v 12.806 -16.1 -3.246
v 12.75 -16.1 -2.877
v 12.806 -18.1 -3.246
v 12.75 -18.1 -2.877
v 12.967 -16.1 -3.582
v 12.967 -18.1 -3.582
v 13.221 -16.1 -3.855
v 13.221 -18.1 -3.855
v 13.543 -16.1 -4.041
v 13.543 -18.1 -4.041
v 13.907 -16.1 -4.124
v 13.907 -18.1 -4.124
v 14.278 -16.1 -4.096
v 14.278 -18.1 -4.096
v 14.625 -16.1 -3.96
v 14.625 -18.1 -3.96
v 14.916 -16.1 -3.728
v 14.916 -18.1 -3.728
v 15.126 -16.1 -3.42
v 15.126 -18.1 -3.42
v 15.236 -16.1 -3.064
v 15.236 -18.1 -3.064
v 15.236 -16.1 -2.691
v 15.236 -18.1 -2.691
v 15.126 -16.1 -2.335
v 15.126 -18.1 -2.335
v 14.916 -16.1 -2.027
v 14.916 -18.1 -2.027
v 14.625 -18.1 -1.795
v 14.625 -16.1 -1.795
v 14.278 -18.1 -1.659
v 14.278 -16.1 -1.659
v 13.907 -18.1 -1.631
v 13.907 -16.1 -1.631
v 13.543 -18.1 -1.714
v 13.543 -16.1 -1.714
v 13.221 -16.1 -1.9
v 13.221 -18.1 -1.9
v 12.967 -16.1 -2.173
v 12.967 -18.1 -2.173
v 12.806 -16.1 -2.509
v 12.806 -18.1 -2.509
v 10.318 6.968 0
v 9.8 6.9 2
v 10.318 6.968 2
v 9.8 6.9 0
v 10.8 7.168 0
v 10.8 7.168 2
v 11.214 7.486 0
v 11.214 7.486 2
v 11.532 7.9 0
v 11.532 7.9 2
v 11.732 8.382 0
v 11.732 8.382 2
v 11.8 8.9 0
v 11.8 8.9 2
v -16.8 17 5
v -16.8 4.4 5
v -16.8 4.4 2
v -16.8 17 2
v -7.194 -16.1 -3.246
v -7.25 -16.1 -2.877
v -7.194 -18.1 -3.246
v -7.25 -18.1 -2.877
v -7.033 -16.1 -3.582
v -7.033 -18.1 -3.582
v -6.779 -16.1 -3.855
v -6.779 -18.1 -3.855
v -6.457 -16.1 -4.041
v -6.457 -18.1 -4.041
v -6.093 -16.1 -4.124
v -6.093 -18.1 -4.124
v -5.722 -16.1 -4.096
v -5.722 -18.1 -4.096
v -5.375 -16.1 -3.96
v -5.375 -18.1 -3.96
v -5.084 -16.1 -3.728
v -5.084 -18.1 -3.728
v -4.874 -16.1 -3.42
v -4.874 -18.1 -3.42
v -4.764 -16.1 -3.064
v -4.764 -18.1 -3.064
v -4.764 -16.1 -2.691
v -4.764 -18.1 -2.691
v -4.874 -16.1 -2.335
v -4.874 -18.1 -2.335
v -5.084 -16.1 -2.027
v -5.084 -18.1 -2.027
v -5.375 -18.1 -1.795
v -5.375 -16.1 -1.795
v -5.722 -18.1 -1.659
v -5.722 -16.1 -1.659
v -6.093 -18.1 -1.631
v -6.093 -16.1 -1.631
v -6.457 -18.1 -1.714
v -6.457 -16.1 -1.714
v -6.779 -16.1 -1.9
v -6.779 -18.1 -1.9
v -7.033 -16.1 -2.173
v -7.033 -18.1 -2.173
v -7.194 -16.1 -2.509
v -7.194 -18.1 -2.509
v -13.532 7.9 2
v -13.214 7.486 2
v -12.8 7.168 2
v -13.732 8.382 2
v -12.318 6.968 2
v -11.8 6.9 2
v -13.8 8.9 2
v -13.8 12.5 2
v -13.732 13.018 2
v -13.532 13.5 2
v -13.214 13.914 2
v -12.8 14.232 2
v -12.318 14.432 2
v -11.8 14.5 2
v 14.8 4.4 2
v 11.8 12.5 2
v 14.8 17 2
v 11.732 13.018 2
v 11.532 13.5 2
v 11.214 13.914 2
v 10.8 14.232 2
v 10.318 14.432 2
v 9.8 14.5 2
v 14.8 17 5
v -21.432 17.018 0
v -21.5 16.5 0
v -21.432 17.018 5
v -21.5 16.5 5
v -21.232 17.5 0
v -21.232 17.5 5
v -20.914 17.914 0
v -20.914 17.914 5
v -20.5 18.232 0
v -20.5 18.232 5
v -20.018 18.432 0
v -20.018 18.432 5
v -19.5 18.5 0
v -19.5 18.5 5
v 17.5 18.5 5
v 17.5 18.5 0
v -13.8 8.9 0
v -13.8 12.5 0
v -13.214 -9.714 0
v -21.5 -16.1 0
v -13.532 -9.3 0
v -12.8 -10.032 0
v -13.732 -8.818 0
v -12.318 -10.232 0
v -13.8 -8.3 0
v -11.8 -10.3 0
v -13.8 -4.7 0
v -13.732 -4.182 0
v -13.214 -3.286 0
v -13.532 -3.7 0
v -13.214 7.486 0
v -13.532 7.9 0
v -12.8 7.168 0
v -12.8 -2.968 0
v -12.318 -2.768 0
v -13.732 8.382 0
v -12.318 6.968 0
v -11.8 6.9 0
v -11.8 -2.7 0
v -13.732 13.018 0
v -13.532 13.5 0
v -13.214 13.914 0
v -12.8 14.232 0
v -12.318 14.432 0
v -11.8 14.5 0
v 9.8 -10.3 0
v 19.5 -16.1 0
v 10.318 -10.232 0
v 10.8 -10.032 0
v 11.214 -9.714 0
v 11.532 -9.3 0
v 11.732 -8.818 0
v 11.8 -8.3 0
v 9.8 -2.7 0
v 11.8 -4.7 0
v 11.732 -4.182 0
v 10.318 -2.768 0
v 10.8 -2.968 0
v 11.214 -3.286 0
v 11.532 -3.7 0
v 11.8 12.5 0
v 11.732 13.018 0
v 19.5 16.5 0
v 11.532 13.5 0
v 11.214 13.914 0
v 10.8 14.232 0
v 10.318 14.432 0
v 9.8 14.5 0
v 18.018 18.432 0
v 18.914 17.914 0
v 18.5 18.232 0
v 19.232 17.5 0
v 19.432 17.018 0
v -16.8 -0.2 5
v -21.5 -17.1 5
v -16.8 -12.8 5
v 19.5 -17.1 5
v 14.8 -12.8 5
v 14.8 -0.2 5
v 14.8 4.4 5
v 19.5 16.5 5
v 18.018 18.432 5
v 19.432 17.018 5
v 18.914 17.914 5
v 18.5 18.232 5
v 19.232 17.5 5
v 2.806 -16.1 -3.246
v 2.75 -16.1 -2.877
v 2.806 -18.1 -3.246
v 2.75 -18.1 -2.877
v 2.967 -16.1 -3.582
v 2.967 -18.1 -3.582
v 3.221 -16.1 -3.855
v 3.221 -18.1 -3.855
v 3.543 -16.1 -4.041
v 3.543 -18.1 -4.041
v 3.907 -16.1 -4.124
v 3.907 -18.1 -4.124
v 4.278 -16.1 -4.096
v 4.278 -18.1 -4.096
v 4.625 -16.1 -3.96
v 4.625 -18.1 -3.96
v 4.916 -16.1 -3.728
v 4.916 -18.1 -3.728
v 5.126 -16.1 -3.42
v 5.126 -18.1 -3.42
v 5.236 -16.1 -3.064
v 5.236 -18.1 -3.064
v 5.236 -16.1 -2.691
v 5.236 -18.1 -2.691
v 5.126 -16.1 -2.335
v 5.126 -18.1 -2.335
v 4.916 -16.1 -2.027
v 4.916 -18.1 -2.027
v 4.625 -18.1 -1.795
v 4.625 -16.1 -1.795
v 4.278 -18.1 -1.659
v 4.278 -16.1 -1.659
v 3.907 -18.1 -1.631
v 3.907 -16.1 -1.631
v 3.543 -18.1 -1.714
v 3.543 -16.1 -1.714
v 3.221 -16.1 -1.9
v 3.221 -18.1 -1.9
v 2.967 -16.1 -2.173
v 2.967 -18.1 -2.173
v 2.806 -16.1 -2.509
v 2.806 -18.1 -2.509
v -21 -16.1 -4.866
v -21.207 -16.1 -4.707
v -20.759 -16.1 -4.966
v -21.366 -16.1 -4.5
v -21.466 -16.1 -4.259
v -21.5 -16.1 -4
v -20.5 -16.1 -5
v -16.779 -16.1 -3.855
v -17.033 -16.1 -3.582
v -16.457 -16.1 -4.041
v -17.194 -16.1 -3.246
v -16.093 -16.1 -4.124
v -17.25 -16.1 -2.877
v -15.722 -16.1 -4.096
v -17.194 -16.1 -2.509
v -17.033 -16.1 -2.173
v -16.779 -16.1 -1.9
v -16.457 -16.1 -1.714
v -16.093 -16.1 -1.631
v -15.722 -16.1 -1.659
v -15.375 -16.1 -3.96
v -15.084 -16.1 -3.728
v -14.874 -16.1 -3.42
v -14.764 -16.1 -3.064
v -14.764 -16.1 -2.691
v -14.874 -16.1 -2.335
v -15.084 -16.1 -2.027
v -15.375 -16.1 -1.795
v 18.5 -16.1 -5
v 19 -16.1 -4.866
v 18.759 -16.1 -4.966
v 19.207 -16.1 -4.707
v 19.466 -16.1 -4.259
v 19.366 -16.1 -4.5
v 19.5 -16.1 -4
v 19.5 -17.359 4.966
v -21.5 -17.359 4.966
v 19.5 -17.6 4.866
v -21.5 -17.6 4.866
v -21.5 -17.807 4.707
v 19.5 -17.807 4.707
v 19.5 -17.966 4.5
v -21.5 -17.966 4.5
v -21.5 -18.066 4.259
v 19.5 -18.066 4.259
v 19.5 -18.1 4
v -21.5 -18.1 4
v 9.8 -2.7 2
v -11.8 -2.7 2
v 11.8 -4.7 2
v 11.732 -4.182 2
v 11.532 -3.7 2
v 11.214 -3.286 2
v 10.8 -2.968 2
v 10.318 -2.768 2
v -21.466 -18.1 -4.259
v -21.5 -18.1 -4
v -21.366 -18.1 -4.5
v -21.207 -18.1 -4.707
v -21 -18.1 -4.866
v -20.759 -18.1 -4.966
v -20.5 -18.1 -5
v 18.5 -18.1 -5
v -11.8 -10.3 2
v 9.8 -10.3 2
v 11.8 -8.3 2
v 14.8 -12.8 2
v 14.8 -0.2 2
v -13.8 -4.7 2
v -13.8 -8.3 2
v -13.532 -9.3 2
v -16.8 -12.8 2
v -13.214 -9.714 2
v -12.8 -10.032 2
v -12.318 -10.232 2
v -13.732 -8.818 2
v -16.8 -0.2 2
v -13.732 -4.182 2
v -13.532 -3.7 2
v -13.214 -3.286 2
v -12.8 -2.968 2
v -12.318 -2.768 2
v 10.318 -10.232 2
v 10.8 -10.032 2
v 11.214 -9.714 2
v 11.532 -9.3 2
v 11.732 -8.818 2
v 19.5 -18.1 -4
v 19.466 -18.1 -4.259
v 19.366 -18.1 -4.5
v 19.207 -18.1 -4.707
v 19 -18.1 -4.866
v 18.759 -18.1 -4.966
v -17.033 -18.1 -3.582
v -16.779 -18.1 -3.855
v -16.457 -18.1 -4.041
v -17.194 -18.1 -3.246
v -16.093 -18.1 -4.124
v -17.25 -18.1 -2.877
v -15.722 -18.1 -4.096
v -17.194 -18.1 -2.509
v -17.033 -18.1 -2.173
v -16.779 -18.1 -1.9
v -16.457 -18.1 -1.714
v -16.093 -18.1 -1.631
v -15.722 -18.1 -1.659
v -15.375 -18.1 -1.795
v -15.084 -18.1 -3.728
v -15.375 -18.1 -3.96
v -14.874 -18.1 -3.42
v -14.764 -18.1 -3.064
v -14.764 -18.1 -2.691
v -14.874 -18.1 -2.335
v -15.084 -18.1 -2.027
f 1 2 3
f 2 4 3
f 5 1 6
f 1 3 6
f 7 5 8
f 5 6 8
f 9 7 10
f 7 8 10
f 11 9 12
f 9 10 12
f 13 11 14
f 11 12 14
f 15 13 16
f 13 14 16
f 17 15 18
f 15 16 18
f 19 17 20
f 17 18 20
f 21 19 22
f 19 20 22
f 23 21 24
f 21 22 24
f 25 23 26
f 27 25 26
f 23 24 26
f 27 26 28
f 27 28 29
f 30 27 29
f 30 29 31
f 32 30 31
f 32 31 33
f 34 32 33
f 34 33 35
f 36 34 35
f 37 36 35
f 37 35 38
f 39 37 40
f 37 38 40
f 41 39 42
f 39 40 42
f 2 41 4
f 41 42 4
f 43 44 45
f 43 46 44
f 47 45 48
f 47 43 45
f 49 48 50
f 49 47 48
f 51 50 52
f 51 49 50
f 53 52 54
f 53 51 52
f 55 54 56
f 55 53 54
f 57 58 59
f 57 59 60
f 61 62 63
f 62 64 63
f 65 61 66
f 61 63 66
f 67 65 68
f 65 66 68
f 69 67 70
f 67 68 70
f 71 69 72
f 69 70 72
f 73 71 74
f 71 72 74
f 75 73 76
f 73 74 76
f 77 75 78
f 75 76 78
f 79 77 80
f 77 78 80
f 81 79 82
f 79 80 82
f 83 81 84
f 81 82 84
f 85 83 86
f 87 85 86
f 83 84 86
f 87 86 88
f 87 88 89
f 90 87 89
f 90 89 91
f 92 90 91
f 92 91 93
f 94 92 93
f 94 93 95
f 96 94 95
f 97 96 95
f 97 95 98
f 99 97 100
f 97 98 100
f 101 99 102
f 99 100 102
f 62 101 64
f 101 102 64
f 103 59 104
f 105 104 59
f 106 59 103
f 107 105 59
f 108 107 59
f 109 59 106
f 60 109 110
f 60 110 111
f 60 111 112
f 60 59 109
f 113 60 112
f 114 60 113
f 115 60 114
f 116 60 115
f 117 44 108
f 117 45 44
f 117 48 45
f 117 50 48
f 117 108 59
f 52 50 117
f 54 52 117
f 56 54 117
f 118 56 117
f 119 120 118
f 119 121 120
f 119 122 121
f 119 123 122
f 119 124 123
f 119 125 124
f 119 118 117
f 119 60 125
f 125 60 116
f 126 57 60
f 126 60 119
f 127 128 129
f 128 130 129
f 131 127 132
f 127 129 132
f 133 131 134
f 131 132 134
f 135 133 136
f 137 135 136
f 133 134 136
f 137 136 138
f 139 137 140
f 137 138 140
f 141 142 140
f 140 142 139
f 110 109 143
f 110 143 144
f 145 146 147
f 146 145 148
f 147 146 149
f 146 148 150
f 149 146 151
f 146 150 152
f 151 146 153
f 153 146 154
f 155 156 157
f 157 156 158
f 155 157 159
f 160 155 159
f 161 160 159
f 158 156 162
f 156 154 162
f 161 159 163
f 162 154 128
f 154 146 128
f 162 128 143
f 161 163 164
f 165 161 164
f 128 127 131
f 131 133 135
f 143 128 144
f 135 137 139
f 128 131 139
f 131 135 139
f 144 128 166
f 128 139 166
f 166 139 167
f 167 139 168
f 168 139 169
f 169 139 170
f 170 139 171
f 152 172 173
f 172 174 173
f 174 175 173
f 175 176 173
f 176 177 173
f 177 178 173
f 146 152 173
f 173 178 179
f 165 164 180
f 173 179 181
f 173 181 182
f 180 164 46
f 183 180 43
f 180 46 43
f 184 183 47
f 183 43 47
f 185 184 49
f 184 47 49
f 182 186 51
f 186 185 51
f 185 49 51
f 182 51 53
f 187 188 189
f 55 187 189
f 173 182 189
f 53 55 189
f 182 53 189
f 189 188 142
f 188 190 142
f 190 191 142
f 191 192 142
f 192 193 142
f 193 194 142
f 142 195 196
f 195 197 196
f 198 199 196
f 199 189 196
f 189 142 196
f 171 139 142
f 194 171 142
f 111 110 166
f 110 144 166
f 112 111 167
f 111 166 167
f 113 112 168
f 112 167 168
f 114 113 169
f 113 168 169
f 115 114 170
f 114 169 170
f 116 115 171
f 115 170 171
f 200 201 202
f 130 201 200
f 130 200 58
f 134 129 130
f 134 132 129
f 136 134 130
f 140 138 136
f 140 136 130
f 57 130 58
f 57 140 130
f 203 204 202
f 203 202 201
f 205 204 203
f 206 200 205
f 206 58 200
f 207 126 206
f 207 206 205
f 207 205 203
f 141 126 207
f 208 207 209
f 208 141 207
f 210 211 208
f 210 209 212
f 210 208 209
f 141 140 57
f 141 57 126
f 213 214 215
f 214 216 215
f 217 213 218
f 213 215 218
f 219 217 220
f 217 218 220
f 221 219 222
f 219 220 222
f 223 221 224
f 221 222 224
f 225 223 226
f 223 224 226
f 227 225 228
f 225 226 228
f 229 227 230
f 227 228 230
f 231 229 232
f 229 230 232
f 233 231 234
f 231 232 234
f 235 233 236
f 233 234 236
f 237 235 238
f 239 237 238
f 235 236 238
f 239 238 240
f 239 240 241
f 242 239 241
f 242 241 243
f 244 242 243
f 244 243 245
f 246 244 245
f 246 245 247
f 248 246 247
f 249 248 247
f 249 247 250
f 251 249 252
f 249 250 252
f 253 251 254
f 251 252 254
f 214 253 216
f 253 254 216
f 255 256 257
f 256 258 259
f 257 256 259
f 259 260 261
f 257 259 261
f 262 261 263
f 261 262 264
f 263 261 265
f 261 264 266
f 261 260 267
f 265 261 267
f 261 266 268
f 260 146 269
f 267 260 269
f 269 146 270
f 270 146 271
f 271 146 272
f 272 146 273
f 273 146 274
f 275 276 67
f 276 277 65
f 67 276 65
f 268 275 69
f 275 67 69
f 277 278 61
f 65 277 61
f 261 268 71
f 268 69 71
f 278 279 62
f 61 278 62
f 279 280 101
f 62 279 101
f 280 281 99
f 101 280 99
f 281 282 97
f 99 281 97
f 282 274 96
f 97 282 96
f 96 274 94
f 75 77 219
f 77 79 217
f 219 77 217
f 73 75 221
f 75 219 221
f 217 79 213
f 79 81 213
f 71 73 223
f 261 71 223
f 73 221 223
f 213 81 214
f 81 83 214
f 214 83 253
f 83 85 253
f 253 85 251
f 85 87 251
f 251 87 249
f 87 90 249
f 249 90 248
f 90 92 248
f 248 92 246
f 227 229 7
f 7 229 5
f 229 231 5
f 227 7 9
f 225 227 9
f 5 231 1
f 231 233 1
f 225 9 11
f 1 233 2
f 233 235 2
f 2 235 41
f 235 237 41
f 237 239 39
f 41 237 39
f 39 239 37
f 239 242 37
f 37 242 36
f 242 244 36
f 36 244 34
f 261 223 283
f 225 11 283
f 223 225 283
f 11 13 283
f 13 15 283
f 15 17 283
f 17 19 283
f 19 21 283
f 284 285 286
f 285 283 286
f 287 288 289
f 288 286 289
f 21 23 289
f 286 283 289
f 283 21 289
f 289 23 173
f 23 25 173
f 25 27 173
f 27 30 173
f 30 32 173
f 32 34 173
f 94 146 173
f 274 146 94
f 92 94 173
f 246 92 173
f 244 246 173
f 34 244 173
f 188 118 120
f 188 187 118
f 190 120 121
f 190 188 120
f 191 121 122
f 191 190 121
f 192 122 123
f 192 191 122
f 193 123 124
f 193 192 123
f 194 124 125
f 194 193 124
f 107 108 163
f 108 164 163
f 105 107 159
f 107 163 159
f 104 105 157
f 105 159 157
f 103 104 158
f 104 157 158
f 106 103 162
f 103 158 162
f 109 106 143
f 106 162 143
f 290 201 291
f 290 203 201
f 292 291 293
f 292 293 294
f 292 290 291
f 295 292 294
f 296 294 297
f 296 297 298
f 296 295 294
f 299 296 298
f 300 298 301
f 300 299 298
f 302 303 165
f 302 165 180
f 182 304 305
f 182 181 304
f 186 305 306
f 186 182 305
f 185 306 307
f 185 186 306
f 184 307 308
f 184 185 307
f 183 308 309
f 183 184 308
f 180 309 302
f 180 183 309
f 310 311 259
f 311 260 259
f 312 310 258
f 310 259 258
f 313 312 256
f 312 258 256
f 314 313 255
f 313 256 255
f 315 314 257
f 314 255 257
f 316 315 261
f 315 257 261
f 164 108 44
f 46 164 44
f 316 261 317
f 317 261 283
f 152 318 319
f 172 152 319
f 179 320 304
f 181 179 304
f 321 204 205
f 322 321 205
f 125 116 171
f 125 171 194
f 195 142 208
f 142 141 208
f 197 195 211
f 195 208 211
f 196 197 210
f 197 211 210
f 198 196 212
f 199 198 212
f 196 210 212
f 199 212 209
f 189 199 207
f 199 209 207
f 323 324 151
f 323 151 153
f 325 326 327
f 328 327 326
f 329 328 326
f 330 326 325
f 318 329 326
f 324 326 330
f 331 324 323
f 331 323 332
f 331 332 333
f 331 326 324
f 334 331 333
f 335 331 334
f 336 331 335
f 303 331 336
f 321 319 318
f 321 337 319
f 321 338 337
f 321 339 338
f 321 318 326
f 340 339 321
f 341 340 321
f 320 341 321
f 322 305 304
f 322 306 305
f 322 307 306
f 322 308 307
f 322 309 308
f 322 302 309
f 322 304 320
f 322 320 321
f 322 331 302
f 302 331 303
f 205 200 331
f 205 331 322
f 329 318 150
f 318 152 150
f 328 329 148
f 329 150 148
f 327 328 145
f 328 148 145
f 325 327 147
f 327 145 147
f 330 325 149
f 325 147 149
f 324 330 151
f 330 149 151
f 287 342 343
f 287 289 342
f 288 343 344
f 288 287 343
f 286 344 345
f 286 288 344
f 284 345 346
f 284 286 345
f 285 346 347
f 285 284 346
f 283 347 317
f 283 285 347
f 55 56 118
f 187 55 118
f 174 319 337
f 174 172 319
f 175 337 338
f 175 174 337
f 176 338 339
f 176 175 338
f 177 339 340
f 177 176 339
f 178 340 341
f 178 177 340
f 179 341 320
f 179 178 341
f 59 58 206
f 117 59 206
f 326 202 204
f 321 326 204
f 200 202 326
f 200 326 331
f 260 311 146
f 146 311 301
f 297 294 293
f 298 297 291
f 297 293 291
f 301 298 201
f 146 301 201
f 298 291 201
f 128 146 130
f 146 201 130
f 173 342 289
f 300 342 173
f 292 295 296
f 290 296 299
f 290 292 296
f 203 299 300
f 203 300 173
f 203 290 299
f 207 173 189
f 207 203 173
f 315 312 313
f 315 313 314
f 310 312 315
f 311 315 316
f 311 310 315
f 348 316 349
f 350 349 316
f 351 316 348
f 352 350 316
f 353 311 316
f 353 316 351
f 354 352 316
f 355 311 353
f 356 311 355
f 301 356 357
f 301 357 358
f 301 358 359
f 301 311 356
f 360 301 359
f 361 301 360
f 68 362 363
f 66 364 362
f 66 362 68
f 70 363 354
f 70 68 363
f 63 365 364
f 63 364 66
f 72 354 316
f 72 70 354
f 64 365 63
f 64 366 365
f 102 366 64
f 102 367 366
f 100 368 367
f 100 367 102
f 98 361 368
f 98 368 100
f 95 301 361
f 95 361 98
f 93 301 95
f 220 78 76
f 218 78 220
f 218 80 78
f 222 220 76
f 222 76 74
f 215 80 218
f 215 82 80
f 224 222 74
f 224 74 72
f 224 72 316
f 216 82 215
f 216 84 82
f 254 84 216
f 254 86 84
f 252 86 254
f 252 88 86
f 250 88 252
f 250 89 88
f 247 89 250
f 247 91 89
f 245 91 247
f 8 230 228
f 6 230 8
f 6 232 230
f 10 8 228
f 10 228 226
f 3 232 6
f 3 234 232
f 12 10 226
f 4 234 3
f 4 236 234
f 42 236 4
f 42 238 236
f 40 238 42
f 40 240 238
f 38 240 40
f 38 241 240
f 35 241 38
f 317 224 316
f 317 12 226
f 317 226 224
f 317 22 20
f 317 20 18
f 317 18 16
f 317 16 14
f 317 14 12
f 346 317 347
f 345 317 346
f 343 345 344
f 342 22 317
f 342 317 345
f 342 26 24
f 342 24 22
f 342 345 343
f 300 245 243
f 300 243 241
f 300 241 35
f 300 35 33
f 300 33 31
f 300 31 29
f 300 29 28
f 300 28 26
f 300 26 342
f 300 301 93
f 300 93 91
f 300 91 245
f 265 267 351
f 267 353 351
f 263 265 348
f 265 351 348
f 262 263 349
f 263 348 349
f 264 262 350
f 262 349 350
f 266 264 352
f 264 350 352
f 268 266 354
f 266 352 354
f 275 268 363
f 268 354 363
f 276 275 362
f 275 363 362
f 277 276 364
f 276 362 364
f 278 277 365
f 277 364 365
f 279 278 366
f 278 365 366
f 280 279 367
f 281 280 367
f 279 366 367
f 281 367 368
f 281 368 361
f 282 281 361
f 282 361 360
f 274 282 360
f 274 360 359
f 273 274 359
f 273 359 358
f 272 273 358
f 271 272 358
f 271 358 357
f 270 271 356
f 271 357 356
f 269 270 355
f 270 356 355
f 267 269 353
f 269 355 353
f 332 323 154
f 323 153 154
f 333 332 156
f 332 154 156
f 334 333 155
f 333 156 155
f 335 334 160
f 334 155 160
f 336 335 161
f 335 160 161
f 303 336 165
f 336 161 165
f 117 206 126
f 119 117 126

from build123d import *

# Parameters (mm, degrees)
SKETCH1_W                   = 42
SKETCH1_H                   = 40.2
BOSS_EXTRUDE1_DEPTH         = 5
SKETCH2_W                   = 31.6
SKETCH2_H                   = 12.6
CUT_EXTRUDE1_DEPTH          = 3
SKETCH3_W                   = 25.6
SKETCH3_H                   = 7.6
CUT_EXTRUDE2_DEPTH          = 3
CUT_EXTRUDE3_DEPTH          = 5
FILLET1_R                   = 2
SKETCH9_W                   = 41
SKETCH9_H                   = 2
BOSS_EXTRUDE3_DEPTH         = 10
FILLET2_R                   = 1
TAP_DRILL_FOR_M3_TAP1_D     = 2.5
TAP_DRILL_FOR_M3_TAP1_DEPTH = 2
TAP_DRILL_FOR_M3_TAP1_TIP   = 0.751075774
FILLET3_R                   = 1


with BuildPart() as part:
    # Sketch1 → Boss-Extrude1 (new body)
    with BuildSketch(Plane.XY):
        with Locations((-0.5, 2.1)):
            Rectangle(SKETCH1_W, SKETCH1_H)
    extrude(amount=BOSS_EXTRUDE1_DEPTH)

    # Sketch2 → Cut-Extrude1 (cut)
    with BuildSketch(Plane.XY.offset(5)):
        with Locations((-1, 10.7)):
            Rectangle(SKETCH2_W, SKETCH2_H)
        with Locations((-1, -6.5)):
            Rectangle(SKETCH2_W, SKETCH2_H)
    extrude(amount=-CUT_EXTRUDE1_DEPTH, mode=Mode.SUBTRACT)

    # Sketch3 → Cut-Extrude2 (cut)
    with BuildSketch(Plane.XY.offset(2)):
        with Locations((-1, 10.7)):
            Rectangle(SKETCH3_W, SKETCH3_H)
        with Locations((-1, -6.5)):
            Rectangle(SKETCH3_W, SKETCH3_H)
    extrude(amount=-CUT_EXTRUDE2_DEPTH, mode=Mode.SUBTRACT)

    # Sketch4 → Cut-Extrude3 (cut)
    with BuildSketch(Plane(origin=(0, 0, 0), x_dir=(-1, 0, 0), z_dir=(0, 0, -1))):
        Polygon((-15.288574128, 22.2), (-20.5, 22.2), (-20.5, 16.307906388), (-20.5, -16.83473783), (-20.5, -18), (-15.288574128, -18), (16.313805872, -18), (21.5, -18), (21.5, -16.83473783), (21.5, -16.1), (-19.5, -16.1), (-19.5, 18.5), (21.5, 18.5), (21.5, 22.2), (16.313805872, 22.2), align=None)
    extrude(amount=-CUT_EXTRUDE3_DEPTH, mode=Mode.SUBTRACT)

    # Fillet1
    fillet1_edges = [part.edges().sort_by_distance(p)[0] for p in [
        (-13.8, 6.9, 1),
        (-13.8, 14.5, 1),
        (11.8, 14.5, 1),
        (11.8, 6.9, 1),
        (-13.8, -10.3, 1),
        (-13.8, -2.7, 1),
        (11.8, -2.7, 1),
        (11.8, -10.3, 1),
        (19.5, 18.5, 2.5),
        (-21.5, 18.5, 2.5),
    ]]
    fillet(fillet1_edges, radius=FILLET1_R)

    # Sketch9 → Boss-Extrude3 (add)
    with BuildSketch(Plane.XY.offset(5)):
        with Locations((-1, -17.1)):
            Rectangle(SKETCH9_W, SKETCH9_H)
    extrude(amount=-BOSS_EXTRUDE3_DEPTH)

    # Fillet2
    fillet2_edges = [part.edges().sort_by_distance(p)[0] for p in [
        (-1, -18.1, 5),
    ]]
    fillet(fillet2_edges, radius=FILLET2_R)

    # Tap Drill for M3 Tap1
    with Locations(Plane(origin=(0, -16.1, 0), x_dir=(1, 0, 0), z_dir=(0, 1, 0))):
        with Locations((14, 2.87743455), (4, 2.87743455), (-6, 2.87743455), (-16, 2.87743455)):
            Hole(TAP_DRILL_FOR_M3_TAP1_D / 2, depth=TAP_DRILL_FOR_M3_TAP1_DEPTH)
            with Locations((0, 0, -(TAP_DRILL_FOR_M3_TAP1_DEPTH + TAP_DRILL_FOR_M3_TAP1_TIP / 2))):  # 118° drill point
                Cone(0, TAP_DRILL_FOR_M3_TAP1_D / 2, TAP_DRILL_FOR_M3_TAP1_TIP, mode=Mode.SUBTRACT)

    # Fillet3
    fillet3_edges = [part.edges().sort_by_distance(p)[0] for p in [
        (-21.5, -17.1, -5),
        (19.5, -17.1, -5),
    ]]
    fillet(fillet3_edges, radius=FILLET3_R)


solid = part.part
